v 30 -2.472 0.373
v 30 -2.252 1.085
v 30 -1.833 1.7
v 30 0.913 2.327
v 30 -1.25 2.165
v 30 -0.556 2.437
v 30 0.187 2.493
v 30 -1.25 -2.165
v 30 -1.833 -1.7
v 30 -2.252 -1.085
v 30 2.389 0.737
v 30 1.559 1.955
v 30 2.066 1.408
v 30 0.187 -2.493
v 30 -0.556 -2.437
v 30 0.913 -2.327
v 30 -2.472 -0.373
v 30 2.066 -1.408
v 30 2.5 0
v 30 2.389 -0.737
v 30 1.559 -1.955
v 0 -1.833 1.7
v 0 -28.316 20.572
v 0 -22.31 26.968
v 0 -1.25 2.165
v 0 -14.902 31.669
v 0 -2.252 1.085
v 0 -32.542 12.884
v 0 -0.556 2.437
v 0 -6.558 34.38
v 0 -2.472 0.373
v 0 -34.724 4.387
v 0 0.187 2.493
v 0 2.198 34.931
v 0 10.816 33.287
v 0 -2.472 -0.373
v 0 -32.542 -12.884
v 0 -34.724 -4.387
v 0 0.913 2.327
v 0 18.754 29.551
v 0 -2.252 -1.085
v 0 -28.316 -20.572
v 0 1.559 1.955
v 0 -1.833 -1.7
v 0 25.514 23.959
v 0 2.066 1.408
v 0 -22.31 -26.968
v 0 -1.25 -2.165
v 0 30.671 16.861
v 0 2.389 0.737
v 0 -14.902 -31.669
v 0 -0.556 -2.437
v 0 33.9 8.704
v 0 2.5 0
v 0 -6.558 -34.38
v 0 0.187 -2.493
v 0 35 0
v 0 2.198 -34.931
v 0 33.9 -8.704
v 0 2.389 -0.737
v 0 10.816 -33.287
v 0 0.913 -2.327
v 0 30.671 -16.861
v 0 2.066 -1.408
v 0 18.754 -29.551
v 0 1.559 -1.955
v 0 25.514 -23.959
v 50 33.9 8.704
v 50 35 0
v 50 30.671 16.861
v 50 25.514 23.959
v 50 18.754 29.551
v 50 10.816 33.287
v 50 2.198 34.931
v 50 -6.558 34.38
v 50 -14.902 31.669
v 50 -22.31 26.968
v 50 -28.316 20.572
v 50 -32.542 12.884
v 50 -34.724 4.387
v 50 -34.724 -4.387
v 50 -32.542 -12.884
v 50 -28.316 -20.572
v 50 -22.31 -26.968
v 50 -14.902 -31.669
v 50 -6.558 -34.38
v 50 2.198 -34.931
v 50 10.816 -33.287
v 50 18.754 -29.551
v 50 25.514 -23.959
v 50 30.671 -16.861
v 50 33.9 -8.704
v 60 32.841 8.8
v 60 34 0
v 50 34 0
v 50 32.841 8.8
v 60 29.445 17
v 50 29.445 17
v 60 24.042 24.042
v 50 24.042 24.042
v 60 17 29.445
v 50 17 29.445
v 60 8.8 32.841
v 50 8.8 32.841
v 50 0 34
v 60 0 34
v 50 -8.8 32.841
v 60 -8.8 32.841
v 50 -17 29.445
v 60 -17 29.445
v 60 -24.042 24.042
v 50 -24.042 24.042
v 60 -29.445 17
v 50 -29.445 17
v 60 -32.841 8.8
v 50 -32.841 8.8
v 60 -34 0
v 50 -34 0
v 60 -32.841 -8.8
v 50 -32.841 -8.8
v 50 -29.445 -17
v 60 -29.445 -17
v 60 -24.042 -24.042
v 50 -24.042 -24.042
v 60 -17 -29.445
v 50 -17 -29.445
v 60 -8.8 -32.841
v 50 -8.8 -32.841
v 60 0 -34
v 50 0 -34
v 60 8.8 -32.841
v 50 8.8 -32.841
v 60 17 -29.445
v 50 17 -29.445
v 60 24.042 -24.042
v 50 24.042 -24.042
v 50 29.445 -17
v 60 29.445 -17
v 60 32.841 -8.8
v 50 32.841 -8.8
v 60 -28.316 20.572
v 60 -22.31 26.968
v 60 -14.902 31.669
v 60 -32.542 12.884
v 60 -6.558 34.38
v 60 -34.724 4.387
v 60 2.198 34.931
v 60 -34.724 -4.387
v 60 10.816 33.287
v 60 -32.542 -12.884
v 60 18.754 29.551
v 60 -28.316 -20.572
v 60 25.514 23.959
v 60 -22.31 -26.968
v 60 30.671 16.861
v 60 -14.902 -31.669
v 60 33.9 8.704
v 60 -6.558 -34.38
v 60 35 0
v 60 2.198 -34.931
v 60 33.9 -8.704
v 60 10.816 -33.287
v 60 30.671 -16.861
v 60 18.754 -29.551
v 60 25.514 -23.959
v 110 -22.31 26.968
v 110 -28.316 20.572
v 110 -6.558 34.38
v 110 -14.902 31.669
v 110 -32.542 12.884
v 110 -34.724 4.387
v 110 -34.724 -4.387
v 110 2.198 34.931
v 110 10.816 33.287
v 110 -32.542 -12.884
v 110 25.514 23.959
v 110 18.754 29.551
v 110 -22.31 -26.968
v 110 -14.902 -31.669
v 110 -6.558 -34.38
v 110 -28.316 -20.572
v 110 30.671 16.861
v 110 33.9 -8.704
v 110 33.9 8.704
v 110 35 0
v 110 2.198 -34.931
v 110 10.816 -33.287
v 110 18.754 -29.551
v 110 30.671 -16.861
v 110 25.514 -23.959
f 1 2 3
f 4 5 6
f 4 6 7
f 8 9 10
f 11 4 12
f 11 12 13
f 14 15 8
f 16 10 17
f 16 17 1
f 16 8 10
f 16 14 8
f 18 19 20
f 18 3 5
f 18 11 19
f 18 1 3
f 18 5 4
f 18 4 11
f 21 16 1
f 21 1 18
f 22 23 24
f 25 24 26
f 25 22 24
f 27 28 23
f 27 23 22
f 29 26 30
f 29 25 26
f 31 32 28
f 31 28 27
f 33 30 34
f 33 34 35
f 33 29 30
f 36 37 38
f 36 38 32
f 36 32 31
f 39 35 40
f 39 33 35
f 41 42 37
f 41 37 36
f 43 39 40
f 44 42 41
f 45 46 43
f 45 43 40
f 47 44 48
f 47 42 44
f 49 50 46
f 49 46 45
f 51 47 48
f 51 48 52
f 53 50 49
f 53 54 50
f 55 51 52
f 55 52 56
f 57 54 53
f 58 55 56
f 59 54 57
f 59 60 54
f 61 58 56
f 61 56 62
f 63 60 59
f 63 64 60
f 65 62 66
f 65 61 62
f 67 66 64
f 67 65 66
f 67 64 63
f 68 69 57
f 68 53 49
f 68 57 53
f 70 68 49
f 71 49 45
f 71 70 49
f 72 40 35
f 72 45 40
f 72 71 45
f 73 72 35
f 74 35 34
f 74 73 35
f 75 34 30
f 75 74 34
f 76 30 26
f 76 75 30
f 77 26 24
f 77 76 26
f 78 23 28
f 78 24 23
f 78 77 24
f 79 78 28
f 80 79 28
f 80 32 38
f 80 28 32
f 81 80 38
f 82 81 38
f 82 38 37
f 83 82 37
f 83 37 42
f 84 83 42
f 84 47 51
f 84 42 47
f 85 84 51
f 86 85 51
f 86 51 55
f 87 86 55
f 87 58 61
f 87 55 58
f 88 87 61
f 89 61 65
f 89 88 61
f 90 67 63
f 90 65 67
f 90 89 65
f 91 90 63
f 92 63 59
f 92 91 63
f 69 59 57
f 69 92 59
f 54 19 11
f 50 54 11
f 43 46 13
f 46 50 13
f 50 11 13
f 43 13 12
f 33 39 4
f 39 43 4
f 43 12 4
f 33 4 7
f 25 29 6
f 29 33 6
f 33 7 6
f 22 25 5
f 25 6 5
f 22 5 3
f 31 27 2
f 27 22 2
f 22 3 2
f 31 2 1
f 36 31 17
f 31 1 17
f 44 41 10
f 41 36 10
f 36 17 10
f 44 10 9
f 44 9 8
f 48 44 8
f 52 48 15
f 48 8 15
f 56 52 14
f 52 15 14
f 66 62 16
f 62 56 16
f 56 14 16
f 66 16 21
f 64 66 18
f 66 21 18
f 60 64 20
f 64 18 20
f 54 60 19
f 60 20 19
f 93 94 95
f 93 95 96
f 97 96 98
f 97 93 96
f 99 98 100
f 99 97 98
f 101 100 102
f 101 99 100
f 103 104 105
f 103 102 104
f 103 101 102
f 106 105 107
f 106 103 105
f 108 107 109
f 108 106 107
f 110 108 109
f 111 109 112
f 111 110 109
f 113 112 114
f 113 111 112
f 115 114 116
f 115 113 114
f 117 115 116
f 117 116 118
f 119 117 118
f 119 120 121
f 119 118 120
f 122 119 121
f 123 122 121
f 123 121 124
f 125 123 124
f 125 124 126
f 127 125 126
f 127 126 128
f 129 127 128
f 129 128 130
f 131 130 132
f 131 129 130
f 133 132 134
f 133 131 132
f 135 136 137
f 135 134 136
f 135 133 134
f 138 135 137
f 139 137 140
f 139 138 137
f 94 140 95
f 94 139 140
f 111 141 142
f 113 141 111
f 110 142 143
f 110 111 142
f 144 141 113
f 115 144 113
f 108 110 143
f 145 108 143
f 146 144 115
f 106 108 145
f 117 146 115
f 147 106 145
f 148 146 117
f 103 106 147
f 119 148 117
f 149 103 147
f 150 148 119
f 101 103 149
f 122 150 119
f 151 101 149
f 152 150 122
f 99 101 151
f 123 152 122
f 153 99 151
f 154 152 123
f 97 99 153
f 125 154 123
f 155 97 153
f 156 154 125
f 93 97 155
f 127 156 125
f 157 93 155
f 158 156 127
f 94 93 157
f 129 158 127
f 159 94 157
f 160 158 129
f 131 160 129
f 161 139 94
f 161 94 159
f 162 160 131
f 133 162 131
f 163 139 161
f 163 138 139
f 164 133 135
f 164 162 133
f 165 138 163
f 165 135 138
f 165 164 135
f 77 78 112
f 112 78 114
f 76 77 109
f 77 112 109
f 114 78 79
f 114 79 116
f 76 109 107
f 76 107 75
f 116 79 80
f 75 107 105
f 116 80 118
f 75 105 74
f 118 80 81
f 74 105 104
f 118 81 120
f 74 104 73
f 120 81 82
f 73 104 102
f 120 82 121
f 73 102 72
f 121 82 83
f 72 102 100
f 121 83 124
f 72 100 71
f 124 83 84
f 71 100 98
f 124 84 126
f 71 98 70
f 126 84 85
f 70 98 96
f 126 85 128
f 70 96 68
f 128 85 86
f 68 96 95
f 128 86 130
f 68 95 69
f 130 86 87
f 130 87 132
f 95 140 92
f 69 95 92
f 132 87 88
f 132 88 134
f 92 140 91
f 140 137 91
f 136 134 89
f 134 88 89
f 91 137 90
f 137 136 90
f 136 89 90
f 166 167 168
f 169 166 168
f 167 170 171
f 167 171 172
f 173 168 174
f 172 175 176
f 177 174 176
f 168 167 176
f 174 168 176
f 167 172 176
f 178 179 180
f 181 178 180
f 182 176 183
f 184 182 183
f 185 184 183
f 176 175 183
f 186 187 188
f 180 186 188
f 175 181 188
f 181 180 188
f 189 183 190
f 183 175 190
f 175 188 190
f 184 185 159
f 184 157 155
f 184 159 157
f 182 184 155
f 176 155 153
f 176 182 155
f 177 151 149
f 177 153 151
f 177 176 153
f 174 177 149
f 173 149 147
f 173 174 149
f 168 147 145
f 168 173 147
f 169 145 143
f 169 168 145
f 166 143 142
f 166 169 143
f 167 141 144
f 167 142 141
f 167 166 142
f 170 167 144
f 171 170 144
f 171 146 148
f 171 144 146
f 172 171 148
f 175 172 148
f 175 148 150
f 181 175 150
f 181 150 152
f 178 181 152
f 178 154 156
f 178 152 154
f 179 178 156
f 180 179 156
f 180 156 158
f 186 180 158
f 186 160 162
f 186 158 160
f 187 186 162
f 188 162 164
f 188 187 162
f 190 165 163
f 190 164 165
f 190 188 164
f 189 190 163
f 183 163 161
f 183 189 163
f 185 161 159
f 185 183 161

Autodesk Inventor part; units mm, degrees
ref_plane "YZ Plane" through (0, 0, 0) normal (1, 0, 0) x (0, 1, 0)
ref_plane "XZ Plane" through (0, 0, 0) normal (0, 1, 0) x (-1, 0, 0)
ref_plane "XY Plane" through (0, 0, 0) normal (0, 0, 1) x (1, 0, 0)
sketch "Sketch1" plane through (0, 0, 0) normal (0, 0, 1) x (1, 0, 0)
  line L0 (0, 2.5) -> (0, 35)
  line L1 (0, 35) -> (50, 35)
  line L2 (50, 35) -> (50, 34)
  line L3 (50, 34) -> (60, 34)
  line L4 (60, 34) -> (60, 35)
  line L5 (60, 35) -> (110, 35)
  line L6 (110, 35) -> (110, 0)
  line L7 (110, 0) -> (30, 0)
  line L8 (0, 2.5) -> (30, 2.5)
  line L9 (30, 2.5) -> (30, 0)
  point P0 (0, 0)
  dimension "d1" = 1
  dimension "d2" = 10
  dimension "d3" = 50
  dimension "d4" = 50
  dimension "d5" = 1
  dimension "d8" = 2.5
  dimension "d9" = 35
  dimension "d10" = 30
  dimension "d12" = 30
  dimension "d14" = 110
revolve "Revolution1" add sketch "Sketch1" angle 360 about axis through (110, 0, 0) along (-1, 0, 0)
properties part number "CAM_demo" material "Aluminum 6061"
